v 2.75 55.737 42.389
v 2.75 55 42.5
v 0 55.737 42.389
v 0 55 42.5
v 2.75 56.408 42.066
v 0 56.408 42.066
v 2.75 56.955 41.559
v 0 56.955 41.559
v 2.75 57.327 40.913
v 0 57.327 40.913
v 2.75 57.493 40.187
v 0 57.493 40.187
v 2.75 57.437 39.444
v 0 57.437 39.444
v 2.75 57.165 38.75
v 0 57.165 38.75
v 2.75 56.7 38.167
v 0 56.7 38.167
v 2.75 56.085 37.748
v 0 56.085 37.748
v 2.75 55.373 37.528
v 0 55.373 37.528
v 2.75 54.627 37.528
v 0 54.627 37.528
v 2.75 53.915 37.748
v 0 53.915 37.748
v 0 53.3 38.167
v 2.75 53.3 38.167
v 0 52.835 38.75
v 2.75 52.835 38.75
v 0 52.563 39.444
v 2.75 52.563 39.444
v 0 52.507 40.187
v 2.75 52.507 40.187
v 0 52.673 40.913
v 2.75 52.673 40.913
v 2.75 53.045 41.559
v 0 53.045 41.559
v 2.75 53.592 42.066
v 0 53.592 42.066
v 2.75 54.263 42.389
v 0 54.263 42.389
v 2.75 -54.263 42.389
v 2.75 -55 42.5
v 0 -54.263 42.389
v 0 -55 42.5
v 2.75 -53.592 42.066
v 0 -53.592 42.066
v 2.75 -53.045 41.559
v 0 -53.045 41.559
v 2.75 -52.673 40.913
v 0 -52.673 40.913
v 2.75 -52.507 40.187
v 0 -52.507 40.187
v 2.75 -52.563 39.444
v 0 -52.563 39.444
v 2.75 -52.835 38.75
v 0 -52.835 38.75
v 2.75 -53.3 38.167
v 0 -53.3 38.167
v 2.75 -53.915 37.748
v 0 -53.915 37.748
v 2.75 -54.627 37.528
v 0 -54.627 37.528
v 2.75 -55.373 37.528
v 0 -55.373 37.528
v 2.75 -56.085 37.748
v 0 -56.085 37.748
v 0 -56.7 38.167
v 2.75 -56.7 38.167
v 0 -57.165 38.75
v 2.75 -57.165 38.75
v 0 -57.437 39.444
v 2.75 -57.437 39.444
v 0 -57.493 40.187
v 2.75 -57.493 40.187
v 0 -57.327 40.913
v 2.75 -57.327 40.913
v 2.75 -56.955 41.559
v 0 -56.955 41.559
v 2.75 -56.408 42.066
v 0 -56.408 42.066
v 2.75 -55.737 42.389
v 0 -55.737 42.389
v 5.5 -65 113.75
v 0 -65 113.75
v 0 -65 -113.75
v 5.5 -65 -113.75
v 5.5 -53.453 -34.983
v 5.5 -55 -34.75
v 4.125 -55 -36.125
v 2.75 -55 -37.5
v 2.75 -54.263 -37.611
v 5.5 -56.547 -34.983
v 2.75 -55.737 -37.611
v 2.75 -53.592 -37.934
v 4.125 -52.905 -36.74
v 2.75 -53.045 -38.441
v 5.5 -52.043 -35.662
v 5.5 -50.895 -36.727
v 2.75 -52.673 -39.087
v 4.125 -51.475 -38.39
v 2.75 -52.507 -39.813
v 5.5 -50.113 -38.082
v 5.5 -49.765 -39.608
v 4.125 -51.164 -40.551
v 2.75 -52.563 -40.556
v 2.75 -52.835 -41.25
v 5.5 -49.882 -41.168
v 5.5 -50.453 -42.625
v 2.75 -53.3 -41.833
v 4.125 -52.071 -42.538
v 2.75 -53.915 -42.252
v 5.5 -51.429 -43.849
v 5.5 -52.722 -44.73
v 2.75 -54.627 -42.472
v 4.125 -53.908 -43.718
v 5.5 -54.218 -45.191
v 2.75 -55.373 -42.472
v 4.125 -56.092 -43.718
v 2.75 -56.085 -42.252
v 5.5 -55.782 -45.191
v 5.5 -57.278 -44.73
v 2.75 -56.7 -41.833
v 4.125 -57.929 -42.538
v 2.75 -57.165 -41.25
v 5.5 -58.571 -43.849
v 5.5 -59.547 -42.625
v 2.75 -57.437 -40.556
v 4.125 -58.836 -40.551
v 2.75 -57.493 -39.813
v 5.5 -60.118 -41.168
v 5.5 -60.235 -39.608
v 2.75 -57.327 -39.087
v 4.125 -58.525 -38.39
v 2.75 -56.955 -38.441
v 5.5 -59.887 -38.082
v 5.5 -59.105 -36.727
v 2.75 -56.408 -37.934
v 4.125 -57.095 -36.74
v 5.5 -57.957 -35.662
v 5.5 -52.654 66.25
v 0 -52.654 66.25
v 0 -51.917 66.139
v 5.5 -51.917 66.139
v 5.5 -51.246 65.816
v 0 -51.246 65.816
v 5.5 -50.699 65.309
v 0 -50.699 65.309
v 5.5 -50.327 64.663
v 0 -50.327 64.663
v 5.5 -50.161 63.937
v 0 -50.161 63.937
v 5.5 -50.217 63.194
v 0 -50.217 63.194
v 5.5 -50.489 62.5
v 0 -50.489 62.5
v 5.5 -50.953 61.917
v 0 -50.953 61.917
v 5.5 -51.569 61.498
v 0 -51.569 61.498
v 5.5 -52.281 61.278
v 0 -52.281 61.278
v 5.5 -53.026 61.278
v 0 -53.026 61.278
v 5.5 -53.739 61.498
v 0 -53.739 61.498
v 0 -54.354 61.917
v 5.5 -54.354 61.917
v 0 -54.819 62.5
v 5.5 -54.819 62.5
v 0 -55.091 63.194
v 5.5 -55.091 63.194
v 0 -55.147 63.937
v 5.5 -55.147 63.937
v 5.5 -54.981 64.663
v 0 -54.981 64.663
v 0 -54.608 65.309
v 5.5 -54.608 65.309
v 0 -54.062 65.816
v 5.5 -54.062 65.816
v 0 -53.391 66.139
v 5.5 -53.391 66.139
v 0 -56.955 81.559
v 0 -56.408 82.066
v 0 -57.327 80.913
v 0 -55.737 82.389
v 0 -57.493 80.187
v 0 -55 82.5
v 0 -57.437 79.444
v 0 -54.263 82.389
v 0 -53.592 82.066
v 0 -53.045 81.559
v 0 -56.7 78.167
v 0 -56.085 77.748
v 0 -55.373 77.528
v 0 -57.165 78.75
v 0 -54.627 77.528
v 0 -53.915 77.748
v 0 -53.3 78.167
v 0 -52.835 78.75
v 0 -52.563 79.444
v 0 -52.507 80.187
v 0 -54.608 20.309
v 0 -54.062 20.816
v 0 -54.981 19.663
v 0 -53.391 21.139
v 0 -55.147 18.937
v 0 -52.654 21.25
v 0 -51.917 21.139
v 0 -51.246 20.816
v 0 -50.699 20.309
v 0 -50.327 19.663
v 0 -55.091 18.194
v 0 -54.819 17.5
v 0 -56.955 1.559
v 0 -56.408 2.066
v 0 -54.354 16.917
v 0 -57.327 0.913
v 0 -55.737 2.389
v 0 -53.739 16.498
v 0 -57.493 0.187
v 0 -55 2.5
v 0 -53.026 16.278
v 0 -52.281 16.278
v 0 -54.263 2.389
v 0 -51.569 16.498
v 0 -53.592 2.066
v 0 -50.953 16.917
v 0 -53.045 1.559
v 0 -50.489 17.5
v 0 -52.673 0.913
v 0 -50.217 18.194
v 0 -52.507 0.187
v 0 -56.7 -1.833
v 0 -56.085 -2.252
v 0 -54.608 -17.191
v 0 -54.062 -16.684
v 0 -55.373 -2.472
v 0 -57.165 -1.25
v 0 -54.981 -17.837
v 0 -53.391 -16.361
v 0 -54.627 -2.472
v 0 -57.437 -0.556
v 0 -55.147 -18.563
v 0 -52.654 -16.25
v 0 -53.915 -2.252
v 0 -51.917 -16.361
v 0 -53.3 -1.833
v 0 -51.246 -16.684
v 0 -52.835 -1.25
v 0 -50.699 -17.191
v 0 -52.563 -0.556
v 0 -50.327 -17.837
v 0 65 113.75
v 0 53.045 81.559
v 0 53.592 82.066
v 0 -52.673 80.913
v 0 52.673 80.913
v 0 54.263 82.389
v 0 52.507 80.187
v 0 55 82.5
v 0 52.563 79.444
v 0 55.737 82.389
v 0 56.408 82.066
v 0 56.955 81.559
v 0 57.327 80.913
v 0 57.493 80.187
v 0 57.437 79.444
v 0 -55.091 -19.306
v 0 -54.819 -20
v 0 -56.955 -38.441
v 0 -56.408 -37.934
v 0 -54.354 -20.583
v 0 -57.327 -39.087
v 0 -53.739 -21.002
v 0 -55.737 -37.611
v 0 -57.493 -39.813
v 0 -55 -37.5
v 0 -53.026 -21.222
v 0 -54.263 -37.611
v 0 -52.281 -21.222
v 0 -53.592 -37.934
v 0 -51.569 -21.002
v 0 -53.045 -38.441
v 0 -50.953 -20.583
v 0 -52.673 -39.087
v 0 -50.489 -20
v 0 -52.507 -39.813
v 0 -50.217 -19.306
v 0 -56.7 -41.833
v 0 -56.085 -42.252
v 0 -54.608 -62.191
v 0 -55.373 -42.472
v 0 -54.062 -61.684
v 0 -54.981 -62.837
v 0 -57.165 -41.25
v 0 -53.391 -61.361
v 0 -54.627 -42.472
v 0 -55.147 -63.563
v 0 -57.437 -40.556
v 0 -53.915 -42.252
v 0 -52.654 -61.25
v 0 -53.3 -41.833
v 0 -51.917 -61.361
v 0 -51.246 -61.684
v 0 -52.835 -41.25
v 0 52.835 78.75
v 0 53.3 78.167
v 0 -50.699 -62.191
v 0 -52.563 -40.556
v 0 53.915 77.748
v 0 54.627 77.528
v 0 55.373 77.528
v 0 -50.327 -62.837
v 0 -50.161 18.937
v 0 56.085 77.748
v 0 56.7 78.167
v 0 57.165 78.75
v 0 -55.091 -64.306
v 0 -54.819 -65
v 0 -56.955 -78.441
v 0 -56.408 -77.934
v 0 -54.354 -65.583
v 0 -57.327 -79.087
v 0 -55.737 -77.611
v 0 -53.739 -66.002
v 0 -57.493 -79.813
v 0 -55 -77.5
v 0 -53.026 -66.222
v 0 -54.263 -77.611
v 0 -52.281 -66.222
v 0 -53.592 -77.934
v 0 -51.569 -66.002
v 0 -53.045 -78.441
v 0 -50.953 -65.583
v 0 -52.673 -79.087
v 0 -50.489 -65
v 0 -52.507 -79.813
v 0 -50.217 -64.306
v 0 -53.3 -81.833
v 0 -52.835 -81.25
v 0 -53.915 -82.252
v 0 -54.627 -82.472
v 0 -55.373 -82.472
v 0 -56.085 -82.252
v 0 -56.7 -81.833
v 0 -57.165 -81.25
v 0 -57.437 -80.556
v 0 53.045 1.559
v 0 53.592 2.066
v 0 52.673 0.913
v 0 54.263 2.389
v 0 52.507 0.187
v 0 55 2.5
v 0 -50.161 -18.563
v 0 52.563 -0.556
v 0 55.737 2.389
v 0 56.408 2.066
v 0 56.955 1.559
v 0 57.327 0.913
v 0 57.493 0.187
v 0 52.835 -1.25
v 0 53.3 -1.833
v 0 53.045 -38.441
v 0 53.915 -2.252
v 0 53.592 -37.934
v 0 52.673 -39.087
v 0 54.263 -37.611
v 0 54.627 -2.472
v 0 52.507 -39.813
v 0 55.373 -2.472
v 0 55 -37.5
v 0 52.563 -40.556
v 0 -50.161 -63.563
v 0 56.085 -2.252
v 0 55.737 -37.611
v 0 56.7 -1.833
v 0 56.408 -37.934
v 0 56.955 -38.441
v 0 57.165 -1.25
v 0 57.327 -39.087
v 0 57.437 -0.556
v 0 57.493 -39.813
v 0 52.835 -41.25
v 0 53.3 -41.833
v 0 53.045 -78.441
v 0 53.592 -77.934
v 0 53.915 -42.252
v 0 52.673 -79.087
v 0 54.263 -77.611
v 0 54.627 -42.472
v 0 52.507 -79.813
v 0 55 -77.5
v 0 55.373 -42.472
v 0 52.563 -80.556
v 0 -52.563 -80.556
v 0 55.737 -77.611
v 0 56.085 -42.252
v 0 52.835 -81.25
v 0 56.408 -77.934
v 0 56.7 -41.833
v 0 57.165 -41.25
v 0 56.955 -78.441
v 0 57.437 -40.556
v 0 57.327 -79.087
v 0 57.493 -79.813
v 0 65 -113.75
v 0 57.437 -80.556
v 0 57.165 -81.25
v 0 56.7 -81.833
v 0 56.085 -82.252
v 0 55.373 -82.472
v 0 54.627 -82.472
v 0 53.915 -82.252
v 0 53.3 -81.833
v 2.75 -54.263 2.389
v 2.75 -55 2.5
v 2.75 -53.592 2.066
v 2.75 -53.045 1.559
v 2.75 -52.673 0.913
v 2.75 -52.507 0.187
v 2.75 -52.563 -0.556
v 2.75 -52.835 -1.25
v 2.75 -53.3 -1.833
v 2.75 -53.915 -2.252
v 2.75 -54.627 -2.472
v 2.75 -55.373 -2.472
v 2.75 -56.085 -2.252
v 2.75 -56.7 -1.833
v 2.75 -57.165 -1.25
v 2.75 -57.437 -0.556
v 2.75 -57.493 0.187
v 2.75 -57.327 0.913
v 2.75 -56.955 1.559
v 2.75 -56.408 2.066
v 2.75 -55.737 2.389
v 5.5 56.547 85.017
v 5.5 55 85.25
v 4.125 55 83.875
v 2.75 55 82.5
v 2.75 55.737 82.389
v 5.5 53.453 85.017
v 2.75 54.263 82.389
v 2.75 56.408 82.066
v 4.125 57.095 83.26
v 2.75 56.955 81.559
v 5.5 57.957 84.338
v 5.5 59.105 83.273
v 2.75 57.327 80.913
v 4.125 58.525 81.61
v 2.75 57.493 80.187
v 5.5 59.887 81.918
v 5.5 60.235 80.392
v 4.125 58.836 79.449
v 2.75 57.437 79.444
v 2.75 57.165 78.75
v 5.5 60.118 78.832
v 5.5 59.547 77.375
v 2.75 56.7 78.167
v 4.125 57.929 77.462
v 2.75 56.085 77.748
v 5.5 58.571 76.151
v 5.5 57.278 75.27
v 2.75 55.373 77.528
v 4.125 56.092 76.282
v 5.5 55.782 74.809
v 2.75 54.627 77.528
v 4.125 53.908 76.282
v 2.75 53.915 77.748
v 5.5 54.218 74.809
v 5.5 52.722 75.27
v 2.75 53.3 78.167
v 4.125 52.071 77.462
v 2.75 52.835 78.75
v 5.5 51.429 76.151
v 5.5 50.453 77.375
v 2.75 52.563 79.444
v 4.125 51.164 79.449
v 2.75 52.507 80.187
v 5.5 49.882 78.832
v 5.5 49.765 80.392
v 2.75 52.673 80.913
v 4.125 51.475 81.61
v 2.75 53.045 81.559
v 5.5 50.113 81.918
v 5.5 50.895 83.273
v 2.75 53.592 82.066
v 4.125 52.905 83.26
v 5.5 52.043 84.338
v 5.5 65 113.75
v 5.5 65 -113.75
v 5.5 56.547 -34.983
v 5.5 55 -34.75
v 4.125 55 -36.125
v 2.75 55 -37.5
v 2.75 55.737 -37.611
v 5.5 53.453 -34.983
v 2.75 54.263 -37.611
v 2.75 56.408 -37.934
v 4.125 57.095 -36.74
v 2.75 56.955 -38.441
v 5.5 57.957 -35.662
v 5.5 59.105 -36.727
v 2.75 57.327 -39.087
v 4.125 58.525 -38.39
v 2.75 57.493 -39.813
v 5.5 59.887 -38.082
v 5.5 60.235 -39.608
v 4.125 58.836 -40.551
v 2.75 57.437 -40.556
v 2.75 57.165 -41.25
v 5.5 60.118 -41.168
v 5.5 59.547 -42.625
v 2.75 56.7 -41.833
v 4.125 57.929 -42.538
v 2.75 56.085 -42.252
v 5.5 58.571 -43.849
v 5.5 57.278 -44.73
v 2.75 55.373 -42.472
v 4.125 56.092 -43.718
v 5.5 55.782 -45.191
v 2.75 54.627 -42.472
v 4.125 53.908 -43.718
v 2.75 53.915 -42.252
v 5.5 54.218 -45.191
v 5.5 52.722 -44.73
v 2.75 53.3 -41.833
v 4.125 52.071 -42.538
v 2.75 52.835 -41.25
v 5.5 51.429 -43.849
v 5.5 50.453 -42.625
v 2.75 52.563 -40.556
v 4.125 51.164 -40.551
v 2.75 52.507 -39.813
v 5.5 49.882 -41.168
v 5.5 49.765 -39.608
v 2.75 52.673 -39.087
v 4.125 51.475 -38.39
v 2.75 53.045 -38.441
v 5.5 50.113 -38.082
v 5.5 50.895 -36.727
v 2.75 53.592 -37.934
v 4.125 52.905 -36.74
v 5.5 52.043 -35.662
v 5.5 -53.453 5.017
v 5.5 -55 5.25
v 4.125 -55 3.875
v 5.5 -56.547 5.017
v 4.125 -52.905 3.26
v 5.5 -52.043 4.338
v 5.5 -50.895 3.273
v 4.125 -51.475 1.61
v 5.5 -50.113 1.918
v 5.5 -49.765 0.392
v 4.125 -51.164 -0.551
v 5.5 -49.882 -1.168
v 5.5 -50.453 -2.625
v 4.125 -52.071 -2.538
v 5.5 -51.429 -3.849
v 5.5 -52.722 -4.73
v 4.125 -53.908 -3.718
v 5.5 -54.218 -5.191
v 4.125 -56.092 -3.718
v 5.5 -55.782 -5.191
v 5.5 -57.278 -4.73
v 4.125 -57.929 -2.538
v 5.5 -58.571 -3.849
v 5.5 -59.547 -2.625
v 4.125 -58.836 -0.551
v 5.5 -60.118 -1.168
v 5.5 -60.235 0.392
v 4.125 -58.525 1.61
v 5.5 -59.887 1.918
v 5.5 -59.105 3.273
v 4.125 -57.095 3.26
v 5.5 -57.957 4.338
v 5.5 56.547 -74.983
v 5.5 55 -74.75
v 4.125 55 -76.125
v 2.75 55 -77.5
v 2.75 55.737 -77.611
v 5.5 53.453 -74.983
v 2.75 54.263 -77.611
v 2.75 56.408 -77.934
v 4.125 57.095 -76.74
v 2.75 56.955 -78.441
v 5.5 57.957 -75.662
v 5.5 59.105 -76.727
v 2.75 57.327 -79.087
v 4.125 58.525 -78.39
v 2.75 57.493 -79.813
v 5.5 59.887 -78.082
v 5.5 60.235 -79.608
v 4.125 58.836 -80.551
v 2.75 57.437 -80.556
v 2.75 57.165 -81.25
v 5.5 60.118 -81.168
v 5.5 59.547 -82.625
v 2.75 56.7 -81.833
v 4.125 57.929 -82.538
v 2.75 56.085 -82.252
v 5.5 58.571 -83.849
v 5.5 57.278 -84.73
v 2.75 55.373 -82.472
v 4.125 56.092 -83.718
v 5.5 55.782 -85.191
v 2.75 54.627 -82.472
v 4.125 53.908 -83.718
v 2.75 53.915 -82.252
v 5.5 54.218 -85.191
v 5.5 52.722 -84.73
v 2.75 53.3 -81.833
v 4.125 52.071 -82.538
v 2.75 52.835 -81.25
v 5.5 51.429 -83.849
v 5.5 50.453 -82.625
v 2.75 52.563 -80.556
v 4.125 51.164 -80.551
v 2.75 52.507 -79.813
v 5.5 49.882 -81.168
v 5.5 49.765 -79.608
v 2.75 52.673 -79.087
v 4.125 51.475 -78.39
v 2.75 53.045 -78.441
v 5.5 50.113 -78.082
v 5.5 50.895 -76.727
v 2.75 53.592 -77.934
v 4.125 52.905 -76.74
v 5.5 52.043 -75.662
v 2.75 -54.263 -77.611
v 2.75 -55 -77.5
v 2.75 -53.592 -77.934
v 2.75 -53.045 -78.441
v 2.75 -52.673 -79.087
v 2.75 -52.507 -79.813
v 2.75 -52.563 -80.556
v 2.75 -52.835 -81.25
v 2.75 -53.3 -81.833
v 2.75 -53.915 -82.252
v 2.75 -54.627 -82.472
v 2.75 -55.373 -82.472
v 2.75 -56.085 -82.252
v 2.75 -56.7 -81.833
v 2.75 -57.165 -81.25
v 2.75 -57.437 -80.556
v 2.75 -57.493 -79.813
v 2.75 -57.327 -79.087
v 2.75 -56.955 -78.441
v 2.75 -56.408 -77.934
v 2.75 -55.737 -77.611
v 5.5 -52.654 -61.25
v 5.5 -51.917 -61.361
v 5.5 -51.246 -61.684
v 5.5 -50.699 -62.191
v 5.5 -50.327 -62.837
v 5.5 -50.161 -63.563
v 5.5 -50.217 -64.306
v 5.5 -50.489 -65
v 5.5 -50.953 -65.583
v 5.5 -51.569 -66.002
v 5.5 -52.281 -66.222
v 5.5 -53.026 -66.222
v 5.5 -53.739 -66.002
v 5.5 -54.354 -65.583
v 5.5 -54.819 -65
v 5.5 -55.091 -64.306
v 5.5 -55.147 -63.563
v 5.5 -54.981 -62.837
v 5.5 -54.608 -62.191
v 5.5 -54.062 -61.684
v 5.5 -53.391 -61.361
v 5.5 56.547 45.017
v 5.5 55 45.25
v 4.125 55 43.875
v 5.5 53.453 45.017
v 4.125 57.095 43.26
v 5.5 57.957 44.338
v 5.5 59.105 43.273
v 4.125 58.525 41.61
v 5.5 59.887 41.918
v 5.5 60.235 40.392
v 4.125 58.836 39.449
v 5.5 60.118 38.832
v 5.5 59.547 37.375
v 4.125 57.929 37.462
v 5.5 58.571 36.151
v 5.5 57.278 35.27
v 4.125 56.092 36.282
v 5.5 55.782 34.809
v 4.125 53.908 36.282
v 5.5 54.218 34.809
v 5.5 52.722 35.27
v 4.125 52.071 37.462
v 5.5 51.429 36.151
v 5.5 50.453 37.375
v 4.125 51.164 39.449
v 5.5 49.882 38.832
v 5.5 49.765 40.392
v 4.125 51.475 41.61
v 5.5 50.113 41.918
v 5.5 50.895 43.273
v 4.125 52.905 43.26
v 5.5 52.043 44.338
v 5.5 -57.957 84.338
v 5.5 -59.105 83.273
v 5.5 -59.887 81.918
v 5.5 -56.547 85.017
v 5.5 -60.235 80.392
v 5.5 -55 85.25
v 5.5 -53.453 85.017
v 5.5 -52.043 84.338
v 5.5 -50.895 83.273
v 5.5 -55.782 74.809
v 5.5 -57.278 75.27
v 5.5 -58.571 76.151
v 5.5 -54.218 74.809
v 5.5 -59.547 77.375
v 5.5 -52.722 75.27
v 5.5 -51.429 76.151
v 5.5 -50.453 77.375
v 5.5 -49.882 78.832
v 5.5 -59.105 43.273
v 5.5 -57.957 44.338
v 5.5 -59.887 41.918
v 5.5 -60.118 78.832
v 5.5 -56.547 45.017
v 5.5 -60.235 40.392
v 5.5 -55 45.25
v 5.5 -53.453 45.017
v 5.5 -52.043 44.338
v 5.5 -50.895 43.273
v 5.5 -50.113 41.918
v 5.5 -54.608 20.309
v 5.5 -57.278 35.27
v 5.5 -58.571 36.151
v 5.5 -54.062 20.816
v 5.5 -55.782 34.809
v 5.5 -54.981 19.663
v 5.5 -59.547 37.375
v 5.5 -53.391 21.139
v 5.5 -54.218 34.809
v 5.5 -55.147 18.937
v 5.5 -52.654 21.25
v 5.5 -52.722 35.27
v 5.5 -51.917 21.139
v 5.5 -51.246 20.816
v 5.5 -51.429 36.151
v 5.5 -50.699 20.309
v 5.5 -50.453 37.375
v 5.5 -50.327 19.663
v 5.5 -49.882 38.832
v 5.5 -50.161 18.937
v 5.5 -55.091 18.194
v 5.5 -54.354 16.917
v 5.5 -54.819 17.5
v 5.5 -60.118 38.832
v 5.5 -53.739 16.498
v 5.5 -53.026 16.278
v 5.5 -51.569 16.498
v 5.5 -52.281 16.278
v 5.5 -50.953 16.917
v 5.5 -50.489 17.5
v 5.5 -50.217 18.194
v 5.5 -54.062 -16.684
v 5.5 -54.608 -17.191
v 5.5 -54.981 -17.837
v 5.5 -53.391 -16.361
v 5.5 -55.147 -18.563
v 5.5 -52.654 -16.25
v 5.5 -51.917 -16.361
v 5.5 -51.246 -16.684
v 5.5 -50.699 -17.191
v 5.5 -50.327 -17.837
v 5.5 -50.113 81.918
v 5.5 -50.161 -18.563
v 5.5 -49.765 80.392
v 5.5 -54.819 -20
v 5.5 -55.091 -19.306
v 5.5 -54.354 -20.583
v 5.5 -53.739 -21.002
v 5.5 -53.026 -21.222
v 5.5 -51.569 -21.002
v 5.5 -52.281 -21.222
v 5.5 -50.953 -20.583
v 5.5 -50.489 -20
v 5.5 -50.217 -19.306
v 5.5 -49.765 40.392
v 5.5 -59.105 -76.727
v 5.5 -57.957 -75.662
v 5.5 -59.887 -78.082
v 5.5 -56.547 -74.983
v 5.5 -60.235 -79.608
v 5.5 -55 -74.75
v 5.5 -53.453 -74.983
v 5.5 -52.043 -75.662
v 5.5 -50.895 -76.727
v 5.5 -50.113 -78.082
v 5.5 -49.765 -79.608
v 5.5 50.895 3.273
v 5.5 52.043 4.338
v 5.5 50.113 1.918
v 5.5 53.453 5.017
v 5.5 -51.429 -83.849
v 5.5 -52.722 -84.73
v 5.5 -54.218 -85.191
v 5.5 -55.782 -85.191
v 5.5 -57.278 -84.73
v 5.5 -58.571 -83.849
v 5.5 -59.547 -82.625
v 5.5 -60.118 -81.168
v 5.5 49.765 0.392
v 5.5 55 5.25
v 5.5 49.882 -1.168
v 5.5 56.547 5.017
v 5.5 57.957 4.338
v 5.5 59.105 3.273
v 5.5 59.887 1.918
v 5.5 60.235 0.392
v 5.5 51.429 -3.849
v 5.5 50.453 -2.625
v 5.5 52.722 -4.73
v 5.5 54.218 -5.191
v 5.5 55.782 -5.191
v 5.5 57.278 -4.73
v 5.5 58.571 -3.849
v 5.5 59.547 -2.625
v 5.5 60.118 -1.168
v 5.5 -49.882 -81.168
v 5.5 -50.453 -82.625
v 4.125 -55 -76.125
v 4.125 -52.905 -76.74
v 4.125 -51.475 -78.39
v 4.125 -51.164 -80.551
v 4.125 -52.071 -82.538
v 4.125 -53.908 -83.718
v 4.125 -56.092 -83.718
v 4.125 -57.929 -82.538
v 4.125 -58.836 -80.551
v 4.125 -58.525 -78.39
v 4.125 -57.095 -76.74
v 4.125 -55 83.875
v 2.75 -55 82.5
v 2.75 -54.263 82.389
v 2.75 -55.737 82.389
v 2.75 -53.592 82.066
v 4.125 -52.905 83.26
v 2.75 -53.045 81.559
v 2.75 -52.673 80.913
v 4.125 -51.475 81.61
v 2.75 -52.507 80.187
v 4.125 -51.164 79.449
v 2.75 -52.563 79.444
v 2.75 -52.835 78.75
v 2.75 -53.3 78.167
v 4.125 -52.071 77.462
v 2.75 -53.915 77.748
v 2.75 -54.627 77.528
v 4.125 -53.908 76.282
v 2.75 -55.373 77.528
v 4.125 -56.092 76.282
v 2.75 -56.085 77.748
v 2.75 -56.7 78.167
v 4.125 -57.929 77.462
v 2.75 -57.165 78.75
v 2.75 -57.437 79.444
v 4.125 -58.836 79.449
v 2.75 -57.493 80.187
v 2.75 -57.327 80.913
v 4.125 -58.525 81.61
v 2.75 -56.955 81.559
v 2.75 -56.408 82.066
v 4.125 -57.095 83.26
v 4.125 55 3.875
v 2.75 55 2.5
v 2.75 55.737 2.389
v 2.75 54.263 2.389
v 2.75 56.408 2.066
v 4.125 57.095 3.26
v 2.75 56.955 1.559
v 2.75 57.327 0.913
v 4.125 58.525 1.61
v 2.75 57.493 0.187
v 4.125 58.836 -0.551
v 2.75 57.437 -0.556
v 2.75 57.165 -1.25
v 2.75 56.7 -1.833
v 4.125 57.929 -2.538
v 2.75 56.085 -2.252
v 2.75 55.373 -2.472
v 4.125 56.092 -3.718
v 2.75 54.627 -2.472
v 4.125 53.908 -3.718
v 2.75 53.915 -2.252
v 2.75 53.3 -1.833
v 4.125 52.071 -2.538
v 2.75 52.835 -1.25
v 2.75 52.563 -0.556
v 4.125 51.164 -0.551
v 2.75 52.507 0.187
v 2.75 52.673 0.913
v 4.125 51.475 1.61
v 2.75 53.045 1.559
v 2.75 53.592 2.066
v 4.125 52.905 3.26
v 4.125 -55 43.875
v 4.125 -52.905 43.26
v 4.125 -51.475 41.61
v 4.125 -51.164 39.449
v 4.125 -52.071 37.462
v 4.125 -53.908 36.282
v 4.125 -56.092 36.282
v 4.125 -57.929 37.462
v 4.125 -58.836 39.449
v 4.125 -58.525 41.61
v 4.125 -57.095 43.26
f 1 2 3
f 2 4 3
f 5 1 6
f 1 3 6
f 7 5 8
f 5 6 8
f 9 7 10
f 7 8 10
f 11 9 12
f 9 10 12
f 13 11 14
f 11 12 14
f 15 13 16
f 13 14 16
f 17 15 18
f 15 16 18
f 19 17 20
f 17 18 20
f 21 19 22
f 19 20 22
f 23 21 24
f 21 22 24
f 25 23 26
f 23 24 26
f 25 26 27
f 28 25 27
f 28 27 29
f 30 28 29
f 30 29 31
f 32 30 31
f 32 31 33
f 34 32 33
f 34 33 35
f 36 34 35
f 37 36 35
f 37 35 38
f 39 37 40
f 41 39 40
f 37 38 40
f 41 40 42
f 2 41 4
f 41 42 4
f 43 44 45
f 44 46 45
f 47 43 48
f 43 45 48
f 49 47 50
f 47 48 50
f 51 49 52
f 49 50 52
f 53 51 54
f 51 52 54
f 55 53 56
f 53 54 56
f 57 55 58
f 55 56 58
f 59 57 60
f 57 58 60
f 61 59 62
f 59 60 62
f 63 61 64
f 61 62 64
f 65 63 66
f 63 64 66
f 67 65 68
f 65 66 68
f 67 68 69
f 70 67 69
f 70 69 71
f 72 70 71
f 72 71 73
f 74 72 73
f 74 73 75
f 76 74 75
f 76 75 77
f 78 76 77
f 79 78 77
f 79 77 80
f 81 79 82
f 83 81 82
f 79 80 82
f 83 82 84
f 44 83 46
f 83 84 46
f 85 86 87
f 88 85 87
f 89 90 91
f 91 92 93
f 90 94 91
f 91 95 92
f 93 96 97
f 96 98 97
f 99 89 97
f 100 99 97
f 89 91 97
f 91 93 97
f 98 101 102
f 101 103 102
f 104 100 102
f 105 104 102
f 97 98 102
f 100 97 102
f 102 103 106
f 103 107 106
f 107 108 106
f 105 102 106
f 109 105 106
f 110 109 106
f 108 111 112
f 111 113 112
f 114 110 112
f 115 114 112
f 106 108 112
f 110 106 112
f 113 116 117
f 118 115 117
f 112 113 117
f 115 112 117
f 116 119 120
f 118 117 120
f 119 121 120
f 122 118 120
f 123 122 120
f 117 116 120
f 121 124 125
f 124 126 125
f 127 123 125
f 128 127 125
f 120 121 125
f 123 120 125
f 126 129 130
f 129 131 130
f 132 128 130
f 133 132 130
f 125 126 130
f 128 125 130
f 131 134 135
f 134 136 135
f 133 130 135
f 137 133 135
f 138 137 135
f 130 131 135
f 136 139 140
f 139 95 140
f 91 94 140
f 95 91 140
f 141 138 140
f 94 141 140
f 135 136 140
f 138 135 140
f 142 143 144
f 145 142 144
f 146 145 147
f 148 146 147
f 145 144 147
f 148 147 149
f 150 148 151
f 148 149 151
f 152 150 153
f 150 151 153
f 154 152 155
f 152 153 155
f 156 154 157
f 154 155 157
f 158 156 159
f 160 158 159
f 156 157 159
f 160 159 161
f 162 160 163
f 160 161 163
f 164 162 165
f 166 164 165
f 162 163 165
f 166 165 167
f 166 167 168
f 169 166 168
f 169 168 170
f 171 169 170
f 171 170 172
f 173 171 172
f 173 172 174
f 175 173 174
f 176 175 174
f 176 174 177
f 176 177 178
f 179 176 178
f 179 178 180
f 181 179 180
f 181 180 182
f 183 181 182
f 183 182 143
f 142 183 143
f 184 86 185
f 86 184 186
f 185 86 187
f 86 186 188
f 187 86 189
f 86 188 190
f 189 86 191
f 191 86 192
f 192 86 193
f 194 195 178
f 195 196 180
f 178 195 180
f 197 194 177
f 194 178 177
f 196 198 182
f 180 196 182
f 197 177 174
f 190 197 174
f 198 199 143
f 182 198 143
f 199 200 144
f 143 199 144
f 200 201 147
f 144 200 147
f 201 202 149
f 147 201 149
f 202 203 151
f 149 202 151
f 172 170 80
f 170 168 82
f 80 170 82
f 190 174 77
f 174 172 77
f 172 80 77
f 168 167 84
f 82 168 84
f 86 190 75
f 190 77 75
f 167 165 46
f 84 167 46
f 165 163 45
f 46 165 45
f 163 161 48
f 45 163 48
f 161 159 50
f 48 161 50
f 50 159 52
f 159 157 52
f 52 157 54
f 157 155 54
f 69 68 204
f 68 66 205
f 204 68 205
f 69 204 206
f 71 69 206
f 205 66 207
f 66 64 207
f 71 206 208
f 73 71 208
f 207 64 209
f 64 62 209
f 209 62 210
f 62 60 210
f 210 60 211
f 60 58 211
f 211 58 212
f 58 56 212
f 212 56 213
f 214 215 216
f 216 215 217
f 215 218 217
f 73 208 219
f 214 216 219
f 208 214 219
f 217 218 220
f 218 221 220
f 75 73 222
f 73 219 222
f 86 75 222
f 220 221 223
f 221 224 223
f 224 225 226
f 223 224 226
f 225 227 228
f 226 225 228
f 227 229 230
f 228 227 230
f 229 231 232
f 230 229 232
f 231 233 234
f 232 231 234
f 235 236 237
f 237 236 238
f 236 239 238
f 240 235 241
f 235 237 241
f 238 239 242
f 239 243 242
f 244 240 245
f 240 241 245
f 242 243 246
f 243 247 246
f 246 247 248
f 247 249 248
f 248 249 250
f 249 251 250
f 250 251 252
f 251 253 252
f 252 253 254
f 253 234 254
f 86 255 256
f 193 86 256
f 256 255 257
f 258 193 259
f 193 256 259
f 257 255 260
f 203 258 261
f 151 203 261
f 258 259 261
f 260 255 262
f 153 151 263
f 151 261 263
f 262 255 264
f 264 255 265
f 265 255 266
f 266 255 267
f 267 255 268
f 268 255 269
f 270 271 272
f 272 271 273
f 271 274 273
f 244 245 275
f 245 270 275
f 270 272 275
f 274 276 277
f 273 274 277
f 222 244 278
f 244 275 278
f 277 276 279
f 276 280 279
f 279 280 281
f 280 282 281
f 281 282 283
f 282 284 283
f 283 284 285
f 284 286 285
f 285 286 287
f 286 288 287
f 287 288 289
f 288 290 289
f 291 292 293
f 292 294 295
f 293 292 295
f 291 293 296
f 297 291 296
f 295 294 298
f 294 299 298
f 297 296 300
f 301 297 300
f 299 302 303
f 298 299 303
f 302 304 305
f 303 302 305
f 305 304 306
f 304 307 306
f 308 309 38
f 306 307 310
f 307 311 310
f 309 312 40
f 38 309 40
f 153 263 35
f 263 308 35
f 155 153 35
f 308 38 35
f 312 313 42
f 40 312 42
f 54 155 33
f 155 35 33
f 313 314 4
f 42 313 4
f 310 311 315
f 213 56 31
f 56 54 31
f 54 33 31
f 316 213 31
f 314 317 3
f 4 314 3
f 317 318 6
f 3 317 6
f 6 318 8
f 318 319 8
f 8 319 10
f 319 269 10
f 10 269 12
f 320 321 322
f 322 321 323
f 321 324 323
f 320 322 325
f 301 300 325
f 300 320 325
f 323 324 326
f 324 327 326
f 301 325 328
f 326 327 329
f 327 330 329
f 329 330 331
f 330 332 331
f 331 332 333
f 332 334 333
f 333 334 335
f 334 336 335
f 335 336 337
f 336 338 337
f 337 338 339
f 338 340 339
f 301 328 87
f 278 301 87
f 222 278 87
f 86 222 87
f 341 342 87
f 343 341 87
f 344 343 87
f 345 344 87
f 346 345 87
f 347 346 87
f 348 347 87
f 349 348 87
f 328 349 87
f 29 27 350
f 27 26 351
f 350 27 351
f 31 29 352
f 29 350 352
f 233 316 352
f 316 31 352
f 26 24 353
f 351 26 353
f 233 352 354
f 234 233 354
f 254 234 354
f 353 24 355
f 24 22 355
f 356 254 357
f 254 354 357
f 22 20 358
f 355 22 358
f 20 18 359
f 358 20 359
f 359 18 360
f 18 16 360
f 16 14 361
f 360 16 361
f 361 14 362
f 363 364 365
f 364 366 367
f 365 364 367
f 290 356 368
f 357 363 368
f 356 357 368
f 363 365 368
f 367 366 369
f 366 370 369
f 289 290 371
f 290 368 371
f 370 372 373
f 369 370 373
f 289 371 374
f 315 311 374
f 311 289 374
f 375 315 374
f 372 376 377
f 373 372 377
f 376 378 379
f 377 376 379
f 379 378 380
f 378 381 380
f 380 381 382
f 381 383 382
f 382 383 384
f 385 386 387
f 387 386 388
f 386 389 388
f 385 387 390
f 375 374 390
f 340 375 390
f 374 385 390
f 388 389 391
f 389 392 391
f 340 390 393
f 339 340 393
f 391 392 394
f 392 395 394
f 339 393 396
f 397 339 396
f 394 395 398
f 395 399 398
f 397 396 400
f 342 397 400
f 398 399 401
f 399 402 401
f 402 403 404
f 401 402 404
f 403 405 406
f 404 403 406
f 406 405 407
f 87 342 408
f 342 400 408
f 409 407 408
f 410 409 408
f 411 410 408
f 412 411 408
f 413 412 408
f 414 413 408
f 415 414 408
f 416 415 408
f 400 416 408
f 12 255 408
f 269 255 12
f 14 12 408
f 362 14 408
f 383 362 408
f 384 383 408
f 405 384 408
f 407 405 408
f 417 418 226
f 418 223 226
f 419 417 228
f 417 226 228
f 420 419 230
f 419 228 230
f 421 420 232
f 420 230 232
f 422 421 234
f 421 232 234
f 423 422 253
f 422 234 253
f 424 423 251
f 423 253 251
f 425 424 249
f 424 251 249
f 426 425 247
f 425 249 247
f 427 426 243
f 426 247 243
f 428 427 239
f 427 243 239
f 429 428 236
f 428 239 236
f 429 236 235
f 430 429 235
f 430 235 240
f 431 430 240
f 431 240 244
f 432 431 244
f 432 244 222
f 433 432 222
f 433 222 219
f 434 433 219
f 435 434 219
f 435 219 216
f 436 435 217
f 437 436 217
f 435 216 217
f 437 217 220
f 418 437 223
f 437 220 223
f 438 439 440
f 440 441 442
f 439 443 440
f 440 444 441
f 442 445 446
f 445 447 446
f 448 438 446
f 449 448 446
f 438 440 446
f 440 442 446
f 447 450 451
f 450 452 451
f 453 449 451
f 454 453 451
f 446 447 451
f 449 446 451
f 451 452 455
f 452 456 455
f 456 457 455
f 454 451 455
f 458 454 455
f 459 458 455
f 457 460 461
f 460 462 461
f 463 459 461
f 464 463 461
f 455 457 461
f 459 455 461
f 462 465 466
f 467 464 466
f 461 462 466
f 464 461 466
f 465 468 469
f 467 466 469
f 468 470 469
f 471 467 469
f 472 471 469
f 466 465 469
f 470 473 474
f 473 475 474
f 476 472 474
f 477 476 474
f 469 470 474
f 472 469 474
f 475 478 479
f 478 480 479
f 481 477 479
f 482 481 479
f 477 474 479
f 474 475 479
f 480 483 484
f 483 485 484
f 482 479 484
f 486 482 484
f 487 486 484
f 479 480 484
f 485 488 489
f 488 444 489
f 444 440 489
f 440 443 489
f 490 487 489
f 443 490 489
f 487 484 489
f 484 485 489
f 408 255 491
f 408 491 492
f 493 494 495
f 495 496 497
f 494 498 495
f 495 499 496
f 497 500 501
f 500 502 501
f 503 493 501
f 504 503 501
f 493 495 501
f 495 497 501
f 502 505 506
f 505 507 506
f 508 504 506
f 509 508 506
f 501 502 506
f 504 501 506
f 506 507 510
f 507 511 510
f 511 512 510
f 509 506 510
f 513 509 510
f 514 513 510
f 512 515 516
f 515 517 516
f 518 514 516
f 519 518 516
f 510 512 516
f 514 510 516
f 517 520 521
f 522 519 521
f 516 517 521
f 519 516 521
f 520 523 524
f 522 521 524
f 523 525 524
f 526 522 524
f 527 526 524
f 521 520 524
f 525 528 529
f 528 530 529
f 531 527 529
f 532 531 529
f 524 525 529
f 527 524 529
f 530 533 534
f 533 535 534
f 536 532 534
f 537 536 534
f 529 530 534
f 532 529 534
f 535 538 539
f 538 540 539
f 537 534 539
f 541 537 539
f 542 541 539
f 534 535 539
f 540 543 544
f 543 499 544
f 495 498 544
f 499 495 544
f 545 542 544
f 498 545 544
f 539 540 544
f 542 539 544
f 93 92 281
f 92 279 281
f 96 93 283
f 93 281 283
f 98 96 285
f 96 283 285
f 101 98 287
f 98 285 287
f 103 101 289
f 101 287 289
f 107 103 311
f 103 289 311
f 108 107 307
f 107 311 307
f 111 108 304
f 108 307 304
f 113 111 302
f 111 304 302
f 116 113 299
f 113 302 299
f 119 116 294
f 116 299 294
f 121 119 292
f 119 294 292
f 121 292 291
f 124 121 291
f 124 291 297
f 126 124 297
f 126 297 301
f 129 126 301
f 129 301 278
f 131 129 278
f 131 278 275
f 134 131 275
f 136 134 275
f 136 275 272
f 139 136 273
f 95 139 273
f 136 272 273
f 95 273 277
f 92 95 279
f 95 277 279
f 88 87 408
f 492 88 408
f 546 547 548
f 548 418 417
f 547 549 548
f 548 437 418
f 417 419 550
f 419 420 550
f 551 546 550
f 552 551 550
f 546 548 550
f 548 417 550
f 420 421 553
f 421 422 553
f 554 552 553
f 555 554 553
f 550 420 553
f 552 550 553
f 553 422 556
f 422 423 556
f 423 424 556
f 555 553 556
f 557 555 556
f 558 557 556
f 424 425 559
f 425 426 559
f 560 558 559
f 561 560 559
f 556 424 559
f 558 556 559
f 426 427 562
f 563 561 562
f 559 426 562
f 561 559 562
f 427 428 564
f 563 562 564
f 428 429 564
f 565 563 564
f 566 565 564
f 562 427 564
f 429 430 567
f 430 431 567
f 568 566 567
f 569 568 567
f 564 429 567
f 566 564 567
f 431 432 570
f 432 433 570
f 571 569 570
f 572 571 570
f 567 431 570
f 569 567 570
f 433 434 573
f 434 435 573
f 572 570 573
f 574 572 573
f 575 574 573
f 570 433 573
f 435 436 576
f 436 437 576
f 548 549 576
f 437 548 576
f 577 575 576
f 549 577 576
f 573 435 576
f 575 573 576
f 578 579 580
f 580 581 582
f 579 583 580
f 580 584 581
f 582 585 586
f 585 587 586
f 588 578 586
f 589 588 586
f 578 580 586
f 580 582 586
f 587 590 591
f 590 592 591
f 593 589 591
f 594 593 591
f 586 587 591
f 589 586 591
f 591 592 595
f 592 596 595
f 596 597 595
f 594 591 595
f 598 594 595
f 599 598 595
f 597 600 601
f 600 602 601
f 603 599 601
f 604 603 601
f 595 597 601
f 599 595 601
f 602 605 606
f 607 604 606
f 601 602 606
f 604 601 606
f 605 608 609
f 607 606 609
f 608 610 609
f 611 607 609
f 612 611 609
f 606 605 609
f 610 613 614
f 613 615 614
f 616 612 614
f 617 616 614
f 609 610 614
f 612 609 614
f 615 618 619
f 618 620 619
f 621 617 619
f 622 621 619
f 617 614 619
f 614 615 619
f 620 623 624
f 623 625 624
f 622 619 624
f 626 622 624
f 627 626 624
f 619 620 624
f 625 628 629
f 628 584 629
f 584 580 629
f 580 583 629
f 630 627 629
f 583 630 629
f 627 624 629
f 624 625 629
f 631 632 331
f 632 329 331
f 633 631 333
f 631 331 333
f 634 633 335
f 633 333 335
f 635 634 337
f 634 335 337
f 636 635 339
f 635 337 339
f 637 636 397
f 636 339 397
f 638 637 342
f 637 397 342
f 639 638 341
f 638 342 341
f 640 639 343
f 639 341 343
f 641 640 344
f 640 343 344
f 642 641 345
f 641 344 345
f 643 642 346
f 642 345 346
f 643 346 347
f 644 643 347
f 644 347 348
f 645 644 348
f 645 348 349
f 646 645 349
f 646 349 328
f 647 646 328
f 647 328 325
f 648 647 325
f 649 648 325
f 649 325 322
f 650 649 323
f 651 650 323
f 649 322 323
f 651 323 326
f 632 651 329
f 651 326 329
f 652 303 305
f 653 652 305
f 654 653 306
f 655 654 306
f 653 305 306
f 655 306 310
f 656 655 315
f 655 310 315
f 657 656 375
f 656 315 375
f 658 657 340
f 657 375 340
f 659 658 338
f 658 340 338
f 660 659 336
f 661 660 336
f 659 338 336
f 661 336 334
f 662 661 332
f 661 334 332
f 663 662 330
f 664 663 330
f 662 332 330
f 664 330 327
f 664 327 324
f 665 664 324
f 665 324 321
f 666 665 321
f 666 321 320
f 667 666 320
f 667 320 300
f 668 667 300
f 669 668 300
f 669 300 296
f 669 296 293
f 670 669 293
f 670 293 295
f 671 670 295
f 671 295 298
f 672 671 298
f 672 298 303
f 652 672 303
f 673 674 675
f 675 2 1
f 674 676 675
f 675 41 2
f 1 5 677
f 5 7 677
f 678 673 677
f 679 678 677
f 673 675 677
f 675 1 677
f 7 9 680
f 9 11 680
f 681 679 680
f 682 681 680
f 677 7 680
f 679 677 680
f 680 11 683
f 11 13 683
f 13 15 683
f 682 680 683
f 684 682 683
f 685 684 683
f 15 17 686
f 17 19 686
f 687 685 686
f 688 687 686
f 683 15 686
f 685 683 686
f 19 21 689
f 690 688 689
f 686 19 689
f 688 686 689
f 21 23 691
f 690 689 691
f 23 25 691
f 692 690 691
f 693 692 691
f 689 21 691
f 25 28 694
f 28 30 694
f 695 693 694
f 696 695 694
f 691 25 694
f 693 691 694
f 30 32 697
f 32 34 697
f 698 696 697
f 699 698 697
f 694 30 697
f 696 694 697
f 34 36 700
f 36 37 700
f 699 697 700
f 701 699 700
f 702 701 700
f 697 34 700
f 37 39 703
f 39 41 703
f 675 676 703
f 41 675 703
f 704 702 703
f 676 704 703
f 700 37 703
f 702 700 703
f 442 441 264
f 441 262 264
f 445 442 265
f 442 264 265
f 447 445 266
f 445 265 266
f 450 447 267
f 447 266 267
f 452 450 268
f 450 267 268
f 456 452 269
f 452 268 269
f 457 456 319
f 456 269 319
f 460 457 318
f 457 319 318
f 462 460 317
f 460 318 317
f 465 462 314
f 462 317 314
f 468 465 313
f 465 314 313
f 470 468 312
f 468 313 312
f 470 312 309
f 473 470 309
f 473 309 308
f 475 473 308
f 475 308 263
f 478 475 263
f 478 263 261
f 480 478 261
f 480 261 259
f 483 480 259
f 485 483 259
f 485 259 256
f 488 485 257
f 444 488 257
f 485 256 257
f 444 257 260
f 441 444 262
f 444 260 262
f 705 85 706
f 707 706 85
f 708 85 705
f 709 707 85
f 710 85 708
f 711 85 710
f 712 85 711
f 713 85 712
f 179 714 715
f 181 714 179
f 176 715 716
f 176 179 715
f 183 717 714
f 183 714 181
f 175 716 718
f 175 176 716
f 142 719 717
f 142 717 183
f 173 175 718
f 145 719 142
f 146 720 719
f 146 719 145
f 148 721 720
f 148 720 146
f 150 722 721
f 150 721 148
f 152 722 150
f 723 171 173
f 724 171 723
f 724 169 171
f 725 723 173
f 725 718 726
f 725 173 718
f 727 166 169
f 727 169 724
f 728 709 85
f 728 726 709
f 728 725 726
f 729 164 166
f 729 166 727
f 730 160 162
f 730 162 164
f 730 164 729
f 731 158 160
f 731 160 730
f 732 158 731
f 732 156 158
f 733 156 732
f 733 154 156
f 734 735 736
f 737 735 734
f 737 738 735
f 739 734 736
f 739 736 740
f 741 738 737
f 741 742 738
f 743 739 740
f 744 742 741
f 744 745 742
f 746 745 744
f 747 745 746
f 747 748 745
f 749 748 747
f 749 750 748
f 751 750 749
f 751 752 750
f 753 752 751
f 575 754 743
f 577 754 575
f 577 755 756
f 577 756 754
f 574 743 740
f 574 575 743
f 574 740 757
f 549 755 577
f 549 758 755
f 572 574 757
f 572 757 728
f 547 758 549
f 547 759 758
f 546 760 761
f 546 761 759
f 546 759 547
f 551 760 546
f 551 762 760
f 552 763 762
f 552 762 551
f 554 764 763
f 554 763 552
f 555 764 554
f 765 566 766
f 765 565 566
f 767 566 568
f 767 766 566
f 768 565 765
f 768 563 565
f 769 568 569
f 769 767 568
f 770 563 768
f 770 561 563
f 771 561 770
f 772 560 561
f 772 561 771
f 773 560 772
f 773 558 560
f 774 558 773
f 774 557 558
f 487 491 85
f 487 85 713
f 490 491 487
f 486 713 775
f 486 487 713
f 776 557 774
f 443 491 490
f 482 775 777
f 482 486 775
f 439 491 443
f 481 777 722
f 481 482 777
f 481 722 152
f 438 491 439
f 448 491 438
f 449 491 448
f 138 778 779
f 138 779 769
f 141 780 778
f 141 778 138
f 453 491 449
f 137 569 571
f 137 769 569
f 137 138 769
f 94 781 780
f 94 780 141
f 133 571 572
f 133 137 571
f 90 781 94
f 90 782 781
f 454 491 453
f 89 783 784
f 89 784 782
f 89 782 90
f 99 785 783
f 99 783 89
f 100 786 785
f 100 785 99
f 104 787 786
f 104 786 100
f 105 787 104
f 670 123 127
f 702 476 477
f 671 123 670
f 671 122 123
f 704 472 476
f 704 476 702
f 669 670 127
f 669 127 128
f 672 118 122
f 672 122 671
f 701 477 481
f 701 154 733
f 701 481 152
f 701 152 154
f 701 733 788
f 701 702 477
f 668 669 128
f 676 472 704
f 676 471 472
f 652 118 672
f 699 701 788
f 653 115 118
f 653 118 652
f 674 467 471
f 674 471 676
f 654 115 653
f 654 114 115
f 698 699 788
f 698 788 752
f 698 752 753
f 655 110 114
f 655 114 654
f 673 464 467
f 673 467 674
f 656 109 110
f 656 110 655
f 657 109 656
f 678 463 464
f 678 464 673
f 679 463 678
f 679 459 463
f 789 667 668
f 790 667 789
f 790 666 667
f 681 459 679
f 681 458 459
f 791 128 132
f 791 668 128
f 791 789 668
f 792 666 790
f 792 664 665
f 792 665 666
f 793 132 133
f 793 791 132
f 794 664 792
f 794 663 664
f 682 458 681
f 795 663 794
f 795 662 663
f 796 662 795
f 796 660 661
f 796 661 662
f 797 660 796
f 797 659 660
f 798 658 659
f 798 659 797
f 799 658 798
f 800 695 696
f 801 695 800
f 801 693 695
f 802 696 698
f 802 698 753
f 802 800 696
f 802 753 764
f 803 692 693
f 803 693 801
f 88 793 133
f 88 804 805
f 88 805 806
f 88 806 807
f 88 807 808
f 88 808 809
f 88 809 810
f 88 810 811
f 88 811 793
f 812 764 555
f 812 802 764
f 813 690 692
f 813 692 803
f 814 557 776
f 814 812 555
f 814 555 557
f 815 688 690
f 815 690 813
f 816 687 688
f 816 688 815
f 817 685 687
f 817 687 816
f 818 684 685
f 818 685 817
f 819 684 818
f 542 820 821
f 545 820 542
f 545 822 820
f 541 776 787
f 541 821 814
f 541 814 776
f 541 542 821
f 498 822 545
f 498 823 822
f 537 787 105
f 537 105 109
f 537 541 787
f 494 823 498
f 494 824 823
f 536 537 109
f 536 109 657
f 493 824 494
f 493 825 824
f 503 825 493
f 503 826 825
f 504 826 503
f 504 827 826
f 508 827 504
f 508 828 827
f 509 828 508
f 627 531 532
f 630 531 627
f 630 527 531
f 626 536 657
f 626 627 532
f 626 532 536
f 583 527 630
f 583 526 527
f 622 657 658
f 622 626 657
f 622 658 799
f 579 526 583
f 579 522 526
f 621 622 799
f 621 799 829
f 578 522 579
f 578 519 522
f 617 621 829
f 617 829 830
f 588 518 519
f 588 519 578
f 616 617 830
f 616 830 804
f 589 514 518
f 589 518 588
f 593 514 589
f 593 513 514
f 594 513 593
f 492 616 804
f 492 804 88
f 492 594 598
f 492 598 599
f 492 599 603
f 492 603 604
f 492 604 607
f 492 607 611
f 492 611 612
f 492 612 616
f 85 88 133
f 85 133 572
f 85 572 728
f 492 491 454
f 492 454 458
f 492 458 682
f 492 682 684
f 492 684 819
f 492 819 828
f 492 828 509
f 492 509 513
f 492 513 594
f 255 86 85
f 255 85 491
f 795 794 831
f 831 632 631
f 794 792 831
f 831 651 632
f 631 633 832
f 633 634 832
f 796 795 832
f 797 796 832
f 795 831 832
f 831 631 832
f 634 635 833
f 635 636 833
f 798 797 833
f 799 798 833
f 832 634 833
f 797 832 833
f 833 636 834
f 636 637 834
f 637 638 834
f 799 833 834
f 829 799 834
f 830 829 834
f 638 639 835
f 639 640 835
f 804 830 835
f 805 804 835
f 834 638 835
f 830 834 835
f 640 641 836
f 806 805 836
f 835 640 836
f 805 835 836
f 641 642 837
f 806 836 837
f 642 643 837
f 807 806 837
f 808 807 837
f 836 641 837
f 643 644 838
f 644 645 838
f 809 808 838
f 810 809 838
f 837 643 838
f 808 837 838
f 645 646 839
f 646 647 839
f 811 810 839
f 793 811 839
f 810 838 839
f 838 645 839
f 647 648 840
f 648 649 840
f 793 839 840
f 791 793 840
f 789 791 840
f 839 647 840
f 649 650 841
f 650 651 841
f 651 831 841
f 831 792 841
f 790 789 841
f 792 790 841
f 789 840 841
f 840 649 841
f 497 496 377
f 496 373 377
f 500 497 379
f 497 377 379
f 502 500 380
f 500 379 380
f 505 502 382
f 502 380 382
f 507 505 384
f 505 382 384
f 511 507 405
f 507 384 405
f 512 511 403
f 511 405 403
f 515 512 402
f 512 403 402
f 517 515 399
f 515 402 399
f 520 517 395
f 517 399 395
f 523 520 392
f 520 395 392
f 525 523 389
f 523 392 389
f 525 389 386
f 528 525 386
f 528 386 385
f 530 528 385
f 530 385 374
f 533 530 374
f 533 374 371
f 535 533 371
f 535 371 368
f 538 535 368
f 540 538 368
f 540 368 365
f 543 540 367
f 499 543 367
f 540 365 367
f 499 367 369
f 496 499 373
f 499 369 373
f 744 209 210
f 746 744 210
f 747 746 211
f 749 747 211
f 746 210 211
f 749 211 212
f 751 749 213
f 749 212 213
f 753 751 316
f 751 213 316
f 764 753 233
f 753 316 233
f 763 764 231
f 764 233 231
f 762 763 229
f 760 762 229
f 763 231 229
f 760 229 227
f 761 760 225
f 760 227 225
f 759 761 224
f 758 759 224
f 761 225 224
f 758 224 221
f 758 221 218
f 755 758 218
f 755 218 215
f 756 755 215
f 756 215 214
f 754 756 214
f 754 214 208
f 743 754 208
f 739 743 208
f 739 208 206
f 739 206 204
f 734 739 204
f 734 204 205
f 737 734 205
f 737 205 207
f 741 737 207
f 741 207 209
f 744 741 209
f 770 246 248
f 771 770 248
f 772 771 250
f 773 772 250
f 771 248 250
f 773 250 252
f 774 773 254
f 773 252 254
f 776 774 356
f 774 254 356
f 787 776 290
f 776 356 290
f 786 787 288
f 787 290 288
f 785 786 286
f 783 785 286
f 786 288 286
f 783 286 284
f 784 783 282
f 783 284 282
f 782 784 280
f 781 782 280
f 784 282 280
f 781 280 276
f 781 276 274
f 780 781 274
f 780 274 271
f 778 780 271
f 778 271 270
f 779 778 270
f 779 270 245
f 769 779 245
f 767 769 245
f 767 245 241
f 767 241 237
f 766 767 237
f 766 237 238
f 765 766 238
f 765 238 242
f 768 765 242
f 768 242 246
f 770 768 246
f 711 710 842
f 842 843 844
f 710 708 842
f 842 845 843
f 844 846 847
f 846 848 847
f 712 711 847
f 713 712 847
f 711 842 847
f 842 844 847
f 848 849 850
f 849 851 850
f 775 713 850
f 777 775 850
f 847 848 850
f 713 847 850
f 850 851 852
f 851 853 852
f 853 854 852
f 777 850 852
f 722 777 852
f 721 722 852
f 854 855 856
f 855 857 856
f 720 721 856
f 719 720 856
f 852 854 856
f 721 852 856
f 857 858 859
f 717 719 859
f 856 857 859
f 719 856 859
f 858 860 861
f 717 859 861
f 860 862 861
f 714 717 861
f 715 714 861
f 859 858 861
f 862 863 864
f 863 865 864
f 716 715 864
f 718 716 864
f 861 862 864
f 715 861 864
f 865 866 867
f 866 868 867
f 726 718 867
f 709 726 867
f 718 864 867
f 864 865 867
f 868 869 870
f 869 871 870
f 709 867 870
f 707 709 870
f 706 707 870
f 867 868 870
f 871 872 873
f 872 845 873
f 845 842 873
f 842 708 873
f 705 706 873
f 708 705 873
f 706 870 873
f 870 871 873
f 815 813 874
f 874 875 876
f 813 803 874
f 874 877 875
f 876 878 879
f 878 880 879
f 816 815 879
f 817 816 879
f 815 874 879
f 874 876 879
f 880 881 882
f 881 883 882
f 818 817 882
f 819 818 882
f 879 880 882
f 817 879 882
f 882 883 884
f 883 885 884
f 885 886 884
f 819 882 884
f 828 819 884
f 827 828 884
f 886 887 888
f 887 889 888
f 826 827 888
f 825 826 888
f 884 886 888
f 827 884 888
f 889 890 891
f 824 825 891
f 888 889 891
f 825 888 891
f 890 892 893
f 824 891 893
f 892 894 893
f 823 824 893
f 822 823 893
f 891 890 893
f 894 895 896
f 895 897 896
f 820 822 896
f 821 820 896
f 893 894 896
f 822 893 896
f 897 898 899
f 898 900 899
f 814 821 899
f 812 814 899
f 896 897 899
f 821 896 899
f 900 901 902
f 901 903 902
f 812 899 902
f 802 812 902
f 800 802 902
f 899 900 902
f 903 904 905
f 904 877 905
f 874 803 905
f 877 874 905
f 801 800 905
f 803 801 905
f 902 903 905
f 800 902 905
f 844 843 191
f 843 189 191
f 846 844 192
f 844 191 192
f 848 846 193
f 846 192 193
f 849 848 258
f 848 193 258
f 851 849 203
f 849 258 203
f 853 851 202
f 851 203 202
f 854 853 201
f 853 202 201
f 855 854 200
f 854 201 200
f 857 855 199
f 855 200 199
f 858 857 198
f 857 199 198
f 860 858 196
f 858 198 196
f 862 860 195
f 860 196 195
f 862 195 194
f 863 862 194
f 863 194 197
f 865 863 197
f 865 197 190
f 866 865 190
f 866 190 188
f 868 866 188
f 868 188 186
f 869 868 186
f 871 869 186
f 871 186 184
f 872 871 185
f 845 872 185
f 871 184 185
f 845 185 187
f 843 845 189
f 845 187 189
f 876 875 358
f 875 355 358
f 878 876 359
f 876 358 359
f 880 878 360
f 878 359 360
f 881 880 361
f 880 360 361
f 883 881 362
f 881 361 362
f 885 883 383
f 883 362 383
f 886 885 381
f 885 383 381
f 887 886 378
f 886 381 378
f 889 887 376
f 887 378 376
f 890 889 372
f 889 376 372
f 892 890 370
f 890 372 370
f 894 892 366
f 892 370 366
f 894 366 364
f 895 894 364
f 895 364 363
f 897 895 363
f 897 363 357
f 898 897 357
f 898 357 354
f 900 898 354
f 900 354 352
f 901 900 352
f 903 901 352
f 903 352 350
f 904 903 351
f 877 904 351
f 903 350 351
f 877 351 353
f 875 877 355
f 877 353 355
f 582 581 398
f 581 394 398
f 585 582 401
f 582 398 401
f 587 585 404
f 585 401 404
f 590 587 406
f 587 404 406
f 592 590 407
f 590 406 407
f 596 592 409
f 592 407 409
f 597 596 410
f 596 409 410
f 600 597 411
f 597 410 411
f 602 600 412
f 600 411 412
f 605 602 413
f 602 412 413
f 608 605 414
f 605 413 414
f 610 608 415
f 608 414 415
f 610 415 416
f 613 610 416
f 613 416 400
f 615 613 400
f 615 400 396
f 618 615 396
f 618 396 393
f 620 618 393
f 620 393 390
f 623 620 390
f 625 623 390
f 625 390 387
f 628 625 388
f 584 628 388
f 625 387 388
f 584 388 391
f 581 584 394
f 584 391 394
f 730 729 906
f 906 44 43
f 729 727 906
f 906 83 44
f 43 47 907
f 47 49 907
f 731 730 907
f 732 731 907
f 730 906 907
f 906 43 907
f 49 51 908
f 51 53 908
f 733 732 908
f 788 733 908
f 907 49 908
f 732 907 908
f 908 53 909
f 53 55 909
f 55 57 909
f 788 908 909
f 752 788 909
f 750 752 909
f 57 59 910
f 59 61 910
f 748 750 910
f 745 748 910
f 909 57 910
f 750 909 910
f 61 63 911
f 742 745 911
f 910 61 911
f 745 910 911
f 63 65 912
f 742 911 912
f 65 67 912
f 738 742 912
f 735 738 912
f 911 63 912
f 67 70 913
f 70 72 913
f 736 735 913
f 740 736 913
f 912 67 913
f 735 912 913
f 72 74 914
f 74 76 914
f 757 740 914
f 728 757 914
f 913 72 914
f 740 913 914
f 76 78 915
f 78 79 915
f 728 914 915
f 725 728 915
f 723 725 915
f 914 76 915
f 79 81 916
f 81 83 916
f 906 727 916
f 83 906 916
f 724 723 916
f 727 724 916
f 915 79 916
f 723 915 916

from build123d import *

# Parameters (mm, degrees)
SKETCH1_W                                            = 227.5
SKETCH1_H                                            = 130
BOSS_EXTRUDE1_DEPTH                                  = 5.5
CSK_FOR_M5_HEX_SOCKET_COUNTERSUNK_CAP_SC_D           = 5
CSK_FOR_M5_HEX_SOCKET_COUNTERSUNK_CAP_SC_CSINK_D     = 10.5
CSK_FOR_M5_HEX_SOCKET_COUNTERSUNK_CAP_SC_CSINK_ANGLE = 90
TAP_DRILL_FOR_M5X0_8_TAP1_D                          = 5


with BuildPart() as part:
    # Sketch1 → Boss-Extrude1 (new body)
    with BuildSketch(Plane(origin=(0, 0, 0), x_dir=(0, 0, -1), z_dir=(1, 0, 0))):
        Rectangle(SKETCH1_W, SKETCH1_H)
    extrude(amount=BOSS_EXTRUDE1_DEPTH)

    # CSK for M5 Hex Socket Countersunk Cap Screw1 (through all)
    with Locations(Plane(origin=(5.5, 0, 0), x_dir=(0, 0, -1), z_dir=(1, 0, 0))):
        with Locations((80, 55), (40, 55), (0, 55), (-40, 55), (-80, 55), (-80, -55), (-40, -55), (0, -55), (40, -55), (80, -55)):
            CounterSinkHole(CSK_FOR_M5_HEX_SOCKET_COUNTERSUNK_CAP_SC_D / 2, CSK_FOR_M5_HEX_SOCKET_COUNTERSUNK_CAP_SC_CSINK_D / 2, counter_sink_angle=CSK_FOR_M5_HEX_SOCKET_COUNTERSUNK_CAP_SC_CSINK_ANGLE)

    # Tap Drill for M5x0.8 Tap1 (through all)
    with Locations(Plane(origin=(5.5, 0, 0), x_dir=(0, 0, -1), z_dir=(1, 0, 0))):
        with Locations((-63.75, -52.653836842), (-18.75, -52.653836842), (18.75, -52.653836842), (63.75, -52.653836842)):
            Hole(TAP_DRILL_FOR_M5X0_8_TAP1_D / 2)


solid = part.part
